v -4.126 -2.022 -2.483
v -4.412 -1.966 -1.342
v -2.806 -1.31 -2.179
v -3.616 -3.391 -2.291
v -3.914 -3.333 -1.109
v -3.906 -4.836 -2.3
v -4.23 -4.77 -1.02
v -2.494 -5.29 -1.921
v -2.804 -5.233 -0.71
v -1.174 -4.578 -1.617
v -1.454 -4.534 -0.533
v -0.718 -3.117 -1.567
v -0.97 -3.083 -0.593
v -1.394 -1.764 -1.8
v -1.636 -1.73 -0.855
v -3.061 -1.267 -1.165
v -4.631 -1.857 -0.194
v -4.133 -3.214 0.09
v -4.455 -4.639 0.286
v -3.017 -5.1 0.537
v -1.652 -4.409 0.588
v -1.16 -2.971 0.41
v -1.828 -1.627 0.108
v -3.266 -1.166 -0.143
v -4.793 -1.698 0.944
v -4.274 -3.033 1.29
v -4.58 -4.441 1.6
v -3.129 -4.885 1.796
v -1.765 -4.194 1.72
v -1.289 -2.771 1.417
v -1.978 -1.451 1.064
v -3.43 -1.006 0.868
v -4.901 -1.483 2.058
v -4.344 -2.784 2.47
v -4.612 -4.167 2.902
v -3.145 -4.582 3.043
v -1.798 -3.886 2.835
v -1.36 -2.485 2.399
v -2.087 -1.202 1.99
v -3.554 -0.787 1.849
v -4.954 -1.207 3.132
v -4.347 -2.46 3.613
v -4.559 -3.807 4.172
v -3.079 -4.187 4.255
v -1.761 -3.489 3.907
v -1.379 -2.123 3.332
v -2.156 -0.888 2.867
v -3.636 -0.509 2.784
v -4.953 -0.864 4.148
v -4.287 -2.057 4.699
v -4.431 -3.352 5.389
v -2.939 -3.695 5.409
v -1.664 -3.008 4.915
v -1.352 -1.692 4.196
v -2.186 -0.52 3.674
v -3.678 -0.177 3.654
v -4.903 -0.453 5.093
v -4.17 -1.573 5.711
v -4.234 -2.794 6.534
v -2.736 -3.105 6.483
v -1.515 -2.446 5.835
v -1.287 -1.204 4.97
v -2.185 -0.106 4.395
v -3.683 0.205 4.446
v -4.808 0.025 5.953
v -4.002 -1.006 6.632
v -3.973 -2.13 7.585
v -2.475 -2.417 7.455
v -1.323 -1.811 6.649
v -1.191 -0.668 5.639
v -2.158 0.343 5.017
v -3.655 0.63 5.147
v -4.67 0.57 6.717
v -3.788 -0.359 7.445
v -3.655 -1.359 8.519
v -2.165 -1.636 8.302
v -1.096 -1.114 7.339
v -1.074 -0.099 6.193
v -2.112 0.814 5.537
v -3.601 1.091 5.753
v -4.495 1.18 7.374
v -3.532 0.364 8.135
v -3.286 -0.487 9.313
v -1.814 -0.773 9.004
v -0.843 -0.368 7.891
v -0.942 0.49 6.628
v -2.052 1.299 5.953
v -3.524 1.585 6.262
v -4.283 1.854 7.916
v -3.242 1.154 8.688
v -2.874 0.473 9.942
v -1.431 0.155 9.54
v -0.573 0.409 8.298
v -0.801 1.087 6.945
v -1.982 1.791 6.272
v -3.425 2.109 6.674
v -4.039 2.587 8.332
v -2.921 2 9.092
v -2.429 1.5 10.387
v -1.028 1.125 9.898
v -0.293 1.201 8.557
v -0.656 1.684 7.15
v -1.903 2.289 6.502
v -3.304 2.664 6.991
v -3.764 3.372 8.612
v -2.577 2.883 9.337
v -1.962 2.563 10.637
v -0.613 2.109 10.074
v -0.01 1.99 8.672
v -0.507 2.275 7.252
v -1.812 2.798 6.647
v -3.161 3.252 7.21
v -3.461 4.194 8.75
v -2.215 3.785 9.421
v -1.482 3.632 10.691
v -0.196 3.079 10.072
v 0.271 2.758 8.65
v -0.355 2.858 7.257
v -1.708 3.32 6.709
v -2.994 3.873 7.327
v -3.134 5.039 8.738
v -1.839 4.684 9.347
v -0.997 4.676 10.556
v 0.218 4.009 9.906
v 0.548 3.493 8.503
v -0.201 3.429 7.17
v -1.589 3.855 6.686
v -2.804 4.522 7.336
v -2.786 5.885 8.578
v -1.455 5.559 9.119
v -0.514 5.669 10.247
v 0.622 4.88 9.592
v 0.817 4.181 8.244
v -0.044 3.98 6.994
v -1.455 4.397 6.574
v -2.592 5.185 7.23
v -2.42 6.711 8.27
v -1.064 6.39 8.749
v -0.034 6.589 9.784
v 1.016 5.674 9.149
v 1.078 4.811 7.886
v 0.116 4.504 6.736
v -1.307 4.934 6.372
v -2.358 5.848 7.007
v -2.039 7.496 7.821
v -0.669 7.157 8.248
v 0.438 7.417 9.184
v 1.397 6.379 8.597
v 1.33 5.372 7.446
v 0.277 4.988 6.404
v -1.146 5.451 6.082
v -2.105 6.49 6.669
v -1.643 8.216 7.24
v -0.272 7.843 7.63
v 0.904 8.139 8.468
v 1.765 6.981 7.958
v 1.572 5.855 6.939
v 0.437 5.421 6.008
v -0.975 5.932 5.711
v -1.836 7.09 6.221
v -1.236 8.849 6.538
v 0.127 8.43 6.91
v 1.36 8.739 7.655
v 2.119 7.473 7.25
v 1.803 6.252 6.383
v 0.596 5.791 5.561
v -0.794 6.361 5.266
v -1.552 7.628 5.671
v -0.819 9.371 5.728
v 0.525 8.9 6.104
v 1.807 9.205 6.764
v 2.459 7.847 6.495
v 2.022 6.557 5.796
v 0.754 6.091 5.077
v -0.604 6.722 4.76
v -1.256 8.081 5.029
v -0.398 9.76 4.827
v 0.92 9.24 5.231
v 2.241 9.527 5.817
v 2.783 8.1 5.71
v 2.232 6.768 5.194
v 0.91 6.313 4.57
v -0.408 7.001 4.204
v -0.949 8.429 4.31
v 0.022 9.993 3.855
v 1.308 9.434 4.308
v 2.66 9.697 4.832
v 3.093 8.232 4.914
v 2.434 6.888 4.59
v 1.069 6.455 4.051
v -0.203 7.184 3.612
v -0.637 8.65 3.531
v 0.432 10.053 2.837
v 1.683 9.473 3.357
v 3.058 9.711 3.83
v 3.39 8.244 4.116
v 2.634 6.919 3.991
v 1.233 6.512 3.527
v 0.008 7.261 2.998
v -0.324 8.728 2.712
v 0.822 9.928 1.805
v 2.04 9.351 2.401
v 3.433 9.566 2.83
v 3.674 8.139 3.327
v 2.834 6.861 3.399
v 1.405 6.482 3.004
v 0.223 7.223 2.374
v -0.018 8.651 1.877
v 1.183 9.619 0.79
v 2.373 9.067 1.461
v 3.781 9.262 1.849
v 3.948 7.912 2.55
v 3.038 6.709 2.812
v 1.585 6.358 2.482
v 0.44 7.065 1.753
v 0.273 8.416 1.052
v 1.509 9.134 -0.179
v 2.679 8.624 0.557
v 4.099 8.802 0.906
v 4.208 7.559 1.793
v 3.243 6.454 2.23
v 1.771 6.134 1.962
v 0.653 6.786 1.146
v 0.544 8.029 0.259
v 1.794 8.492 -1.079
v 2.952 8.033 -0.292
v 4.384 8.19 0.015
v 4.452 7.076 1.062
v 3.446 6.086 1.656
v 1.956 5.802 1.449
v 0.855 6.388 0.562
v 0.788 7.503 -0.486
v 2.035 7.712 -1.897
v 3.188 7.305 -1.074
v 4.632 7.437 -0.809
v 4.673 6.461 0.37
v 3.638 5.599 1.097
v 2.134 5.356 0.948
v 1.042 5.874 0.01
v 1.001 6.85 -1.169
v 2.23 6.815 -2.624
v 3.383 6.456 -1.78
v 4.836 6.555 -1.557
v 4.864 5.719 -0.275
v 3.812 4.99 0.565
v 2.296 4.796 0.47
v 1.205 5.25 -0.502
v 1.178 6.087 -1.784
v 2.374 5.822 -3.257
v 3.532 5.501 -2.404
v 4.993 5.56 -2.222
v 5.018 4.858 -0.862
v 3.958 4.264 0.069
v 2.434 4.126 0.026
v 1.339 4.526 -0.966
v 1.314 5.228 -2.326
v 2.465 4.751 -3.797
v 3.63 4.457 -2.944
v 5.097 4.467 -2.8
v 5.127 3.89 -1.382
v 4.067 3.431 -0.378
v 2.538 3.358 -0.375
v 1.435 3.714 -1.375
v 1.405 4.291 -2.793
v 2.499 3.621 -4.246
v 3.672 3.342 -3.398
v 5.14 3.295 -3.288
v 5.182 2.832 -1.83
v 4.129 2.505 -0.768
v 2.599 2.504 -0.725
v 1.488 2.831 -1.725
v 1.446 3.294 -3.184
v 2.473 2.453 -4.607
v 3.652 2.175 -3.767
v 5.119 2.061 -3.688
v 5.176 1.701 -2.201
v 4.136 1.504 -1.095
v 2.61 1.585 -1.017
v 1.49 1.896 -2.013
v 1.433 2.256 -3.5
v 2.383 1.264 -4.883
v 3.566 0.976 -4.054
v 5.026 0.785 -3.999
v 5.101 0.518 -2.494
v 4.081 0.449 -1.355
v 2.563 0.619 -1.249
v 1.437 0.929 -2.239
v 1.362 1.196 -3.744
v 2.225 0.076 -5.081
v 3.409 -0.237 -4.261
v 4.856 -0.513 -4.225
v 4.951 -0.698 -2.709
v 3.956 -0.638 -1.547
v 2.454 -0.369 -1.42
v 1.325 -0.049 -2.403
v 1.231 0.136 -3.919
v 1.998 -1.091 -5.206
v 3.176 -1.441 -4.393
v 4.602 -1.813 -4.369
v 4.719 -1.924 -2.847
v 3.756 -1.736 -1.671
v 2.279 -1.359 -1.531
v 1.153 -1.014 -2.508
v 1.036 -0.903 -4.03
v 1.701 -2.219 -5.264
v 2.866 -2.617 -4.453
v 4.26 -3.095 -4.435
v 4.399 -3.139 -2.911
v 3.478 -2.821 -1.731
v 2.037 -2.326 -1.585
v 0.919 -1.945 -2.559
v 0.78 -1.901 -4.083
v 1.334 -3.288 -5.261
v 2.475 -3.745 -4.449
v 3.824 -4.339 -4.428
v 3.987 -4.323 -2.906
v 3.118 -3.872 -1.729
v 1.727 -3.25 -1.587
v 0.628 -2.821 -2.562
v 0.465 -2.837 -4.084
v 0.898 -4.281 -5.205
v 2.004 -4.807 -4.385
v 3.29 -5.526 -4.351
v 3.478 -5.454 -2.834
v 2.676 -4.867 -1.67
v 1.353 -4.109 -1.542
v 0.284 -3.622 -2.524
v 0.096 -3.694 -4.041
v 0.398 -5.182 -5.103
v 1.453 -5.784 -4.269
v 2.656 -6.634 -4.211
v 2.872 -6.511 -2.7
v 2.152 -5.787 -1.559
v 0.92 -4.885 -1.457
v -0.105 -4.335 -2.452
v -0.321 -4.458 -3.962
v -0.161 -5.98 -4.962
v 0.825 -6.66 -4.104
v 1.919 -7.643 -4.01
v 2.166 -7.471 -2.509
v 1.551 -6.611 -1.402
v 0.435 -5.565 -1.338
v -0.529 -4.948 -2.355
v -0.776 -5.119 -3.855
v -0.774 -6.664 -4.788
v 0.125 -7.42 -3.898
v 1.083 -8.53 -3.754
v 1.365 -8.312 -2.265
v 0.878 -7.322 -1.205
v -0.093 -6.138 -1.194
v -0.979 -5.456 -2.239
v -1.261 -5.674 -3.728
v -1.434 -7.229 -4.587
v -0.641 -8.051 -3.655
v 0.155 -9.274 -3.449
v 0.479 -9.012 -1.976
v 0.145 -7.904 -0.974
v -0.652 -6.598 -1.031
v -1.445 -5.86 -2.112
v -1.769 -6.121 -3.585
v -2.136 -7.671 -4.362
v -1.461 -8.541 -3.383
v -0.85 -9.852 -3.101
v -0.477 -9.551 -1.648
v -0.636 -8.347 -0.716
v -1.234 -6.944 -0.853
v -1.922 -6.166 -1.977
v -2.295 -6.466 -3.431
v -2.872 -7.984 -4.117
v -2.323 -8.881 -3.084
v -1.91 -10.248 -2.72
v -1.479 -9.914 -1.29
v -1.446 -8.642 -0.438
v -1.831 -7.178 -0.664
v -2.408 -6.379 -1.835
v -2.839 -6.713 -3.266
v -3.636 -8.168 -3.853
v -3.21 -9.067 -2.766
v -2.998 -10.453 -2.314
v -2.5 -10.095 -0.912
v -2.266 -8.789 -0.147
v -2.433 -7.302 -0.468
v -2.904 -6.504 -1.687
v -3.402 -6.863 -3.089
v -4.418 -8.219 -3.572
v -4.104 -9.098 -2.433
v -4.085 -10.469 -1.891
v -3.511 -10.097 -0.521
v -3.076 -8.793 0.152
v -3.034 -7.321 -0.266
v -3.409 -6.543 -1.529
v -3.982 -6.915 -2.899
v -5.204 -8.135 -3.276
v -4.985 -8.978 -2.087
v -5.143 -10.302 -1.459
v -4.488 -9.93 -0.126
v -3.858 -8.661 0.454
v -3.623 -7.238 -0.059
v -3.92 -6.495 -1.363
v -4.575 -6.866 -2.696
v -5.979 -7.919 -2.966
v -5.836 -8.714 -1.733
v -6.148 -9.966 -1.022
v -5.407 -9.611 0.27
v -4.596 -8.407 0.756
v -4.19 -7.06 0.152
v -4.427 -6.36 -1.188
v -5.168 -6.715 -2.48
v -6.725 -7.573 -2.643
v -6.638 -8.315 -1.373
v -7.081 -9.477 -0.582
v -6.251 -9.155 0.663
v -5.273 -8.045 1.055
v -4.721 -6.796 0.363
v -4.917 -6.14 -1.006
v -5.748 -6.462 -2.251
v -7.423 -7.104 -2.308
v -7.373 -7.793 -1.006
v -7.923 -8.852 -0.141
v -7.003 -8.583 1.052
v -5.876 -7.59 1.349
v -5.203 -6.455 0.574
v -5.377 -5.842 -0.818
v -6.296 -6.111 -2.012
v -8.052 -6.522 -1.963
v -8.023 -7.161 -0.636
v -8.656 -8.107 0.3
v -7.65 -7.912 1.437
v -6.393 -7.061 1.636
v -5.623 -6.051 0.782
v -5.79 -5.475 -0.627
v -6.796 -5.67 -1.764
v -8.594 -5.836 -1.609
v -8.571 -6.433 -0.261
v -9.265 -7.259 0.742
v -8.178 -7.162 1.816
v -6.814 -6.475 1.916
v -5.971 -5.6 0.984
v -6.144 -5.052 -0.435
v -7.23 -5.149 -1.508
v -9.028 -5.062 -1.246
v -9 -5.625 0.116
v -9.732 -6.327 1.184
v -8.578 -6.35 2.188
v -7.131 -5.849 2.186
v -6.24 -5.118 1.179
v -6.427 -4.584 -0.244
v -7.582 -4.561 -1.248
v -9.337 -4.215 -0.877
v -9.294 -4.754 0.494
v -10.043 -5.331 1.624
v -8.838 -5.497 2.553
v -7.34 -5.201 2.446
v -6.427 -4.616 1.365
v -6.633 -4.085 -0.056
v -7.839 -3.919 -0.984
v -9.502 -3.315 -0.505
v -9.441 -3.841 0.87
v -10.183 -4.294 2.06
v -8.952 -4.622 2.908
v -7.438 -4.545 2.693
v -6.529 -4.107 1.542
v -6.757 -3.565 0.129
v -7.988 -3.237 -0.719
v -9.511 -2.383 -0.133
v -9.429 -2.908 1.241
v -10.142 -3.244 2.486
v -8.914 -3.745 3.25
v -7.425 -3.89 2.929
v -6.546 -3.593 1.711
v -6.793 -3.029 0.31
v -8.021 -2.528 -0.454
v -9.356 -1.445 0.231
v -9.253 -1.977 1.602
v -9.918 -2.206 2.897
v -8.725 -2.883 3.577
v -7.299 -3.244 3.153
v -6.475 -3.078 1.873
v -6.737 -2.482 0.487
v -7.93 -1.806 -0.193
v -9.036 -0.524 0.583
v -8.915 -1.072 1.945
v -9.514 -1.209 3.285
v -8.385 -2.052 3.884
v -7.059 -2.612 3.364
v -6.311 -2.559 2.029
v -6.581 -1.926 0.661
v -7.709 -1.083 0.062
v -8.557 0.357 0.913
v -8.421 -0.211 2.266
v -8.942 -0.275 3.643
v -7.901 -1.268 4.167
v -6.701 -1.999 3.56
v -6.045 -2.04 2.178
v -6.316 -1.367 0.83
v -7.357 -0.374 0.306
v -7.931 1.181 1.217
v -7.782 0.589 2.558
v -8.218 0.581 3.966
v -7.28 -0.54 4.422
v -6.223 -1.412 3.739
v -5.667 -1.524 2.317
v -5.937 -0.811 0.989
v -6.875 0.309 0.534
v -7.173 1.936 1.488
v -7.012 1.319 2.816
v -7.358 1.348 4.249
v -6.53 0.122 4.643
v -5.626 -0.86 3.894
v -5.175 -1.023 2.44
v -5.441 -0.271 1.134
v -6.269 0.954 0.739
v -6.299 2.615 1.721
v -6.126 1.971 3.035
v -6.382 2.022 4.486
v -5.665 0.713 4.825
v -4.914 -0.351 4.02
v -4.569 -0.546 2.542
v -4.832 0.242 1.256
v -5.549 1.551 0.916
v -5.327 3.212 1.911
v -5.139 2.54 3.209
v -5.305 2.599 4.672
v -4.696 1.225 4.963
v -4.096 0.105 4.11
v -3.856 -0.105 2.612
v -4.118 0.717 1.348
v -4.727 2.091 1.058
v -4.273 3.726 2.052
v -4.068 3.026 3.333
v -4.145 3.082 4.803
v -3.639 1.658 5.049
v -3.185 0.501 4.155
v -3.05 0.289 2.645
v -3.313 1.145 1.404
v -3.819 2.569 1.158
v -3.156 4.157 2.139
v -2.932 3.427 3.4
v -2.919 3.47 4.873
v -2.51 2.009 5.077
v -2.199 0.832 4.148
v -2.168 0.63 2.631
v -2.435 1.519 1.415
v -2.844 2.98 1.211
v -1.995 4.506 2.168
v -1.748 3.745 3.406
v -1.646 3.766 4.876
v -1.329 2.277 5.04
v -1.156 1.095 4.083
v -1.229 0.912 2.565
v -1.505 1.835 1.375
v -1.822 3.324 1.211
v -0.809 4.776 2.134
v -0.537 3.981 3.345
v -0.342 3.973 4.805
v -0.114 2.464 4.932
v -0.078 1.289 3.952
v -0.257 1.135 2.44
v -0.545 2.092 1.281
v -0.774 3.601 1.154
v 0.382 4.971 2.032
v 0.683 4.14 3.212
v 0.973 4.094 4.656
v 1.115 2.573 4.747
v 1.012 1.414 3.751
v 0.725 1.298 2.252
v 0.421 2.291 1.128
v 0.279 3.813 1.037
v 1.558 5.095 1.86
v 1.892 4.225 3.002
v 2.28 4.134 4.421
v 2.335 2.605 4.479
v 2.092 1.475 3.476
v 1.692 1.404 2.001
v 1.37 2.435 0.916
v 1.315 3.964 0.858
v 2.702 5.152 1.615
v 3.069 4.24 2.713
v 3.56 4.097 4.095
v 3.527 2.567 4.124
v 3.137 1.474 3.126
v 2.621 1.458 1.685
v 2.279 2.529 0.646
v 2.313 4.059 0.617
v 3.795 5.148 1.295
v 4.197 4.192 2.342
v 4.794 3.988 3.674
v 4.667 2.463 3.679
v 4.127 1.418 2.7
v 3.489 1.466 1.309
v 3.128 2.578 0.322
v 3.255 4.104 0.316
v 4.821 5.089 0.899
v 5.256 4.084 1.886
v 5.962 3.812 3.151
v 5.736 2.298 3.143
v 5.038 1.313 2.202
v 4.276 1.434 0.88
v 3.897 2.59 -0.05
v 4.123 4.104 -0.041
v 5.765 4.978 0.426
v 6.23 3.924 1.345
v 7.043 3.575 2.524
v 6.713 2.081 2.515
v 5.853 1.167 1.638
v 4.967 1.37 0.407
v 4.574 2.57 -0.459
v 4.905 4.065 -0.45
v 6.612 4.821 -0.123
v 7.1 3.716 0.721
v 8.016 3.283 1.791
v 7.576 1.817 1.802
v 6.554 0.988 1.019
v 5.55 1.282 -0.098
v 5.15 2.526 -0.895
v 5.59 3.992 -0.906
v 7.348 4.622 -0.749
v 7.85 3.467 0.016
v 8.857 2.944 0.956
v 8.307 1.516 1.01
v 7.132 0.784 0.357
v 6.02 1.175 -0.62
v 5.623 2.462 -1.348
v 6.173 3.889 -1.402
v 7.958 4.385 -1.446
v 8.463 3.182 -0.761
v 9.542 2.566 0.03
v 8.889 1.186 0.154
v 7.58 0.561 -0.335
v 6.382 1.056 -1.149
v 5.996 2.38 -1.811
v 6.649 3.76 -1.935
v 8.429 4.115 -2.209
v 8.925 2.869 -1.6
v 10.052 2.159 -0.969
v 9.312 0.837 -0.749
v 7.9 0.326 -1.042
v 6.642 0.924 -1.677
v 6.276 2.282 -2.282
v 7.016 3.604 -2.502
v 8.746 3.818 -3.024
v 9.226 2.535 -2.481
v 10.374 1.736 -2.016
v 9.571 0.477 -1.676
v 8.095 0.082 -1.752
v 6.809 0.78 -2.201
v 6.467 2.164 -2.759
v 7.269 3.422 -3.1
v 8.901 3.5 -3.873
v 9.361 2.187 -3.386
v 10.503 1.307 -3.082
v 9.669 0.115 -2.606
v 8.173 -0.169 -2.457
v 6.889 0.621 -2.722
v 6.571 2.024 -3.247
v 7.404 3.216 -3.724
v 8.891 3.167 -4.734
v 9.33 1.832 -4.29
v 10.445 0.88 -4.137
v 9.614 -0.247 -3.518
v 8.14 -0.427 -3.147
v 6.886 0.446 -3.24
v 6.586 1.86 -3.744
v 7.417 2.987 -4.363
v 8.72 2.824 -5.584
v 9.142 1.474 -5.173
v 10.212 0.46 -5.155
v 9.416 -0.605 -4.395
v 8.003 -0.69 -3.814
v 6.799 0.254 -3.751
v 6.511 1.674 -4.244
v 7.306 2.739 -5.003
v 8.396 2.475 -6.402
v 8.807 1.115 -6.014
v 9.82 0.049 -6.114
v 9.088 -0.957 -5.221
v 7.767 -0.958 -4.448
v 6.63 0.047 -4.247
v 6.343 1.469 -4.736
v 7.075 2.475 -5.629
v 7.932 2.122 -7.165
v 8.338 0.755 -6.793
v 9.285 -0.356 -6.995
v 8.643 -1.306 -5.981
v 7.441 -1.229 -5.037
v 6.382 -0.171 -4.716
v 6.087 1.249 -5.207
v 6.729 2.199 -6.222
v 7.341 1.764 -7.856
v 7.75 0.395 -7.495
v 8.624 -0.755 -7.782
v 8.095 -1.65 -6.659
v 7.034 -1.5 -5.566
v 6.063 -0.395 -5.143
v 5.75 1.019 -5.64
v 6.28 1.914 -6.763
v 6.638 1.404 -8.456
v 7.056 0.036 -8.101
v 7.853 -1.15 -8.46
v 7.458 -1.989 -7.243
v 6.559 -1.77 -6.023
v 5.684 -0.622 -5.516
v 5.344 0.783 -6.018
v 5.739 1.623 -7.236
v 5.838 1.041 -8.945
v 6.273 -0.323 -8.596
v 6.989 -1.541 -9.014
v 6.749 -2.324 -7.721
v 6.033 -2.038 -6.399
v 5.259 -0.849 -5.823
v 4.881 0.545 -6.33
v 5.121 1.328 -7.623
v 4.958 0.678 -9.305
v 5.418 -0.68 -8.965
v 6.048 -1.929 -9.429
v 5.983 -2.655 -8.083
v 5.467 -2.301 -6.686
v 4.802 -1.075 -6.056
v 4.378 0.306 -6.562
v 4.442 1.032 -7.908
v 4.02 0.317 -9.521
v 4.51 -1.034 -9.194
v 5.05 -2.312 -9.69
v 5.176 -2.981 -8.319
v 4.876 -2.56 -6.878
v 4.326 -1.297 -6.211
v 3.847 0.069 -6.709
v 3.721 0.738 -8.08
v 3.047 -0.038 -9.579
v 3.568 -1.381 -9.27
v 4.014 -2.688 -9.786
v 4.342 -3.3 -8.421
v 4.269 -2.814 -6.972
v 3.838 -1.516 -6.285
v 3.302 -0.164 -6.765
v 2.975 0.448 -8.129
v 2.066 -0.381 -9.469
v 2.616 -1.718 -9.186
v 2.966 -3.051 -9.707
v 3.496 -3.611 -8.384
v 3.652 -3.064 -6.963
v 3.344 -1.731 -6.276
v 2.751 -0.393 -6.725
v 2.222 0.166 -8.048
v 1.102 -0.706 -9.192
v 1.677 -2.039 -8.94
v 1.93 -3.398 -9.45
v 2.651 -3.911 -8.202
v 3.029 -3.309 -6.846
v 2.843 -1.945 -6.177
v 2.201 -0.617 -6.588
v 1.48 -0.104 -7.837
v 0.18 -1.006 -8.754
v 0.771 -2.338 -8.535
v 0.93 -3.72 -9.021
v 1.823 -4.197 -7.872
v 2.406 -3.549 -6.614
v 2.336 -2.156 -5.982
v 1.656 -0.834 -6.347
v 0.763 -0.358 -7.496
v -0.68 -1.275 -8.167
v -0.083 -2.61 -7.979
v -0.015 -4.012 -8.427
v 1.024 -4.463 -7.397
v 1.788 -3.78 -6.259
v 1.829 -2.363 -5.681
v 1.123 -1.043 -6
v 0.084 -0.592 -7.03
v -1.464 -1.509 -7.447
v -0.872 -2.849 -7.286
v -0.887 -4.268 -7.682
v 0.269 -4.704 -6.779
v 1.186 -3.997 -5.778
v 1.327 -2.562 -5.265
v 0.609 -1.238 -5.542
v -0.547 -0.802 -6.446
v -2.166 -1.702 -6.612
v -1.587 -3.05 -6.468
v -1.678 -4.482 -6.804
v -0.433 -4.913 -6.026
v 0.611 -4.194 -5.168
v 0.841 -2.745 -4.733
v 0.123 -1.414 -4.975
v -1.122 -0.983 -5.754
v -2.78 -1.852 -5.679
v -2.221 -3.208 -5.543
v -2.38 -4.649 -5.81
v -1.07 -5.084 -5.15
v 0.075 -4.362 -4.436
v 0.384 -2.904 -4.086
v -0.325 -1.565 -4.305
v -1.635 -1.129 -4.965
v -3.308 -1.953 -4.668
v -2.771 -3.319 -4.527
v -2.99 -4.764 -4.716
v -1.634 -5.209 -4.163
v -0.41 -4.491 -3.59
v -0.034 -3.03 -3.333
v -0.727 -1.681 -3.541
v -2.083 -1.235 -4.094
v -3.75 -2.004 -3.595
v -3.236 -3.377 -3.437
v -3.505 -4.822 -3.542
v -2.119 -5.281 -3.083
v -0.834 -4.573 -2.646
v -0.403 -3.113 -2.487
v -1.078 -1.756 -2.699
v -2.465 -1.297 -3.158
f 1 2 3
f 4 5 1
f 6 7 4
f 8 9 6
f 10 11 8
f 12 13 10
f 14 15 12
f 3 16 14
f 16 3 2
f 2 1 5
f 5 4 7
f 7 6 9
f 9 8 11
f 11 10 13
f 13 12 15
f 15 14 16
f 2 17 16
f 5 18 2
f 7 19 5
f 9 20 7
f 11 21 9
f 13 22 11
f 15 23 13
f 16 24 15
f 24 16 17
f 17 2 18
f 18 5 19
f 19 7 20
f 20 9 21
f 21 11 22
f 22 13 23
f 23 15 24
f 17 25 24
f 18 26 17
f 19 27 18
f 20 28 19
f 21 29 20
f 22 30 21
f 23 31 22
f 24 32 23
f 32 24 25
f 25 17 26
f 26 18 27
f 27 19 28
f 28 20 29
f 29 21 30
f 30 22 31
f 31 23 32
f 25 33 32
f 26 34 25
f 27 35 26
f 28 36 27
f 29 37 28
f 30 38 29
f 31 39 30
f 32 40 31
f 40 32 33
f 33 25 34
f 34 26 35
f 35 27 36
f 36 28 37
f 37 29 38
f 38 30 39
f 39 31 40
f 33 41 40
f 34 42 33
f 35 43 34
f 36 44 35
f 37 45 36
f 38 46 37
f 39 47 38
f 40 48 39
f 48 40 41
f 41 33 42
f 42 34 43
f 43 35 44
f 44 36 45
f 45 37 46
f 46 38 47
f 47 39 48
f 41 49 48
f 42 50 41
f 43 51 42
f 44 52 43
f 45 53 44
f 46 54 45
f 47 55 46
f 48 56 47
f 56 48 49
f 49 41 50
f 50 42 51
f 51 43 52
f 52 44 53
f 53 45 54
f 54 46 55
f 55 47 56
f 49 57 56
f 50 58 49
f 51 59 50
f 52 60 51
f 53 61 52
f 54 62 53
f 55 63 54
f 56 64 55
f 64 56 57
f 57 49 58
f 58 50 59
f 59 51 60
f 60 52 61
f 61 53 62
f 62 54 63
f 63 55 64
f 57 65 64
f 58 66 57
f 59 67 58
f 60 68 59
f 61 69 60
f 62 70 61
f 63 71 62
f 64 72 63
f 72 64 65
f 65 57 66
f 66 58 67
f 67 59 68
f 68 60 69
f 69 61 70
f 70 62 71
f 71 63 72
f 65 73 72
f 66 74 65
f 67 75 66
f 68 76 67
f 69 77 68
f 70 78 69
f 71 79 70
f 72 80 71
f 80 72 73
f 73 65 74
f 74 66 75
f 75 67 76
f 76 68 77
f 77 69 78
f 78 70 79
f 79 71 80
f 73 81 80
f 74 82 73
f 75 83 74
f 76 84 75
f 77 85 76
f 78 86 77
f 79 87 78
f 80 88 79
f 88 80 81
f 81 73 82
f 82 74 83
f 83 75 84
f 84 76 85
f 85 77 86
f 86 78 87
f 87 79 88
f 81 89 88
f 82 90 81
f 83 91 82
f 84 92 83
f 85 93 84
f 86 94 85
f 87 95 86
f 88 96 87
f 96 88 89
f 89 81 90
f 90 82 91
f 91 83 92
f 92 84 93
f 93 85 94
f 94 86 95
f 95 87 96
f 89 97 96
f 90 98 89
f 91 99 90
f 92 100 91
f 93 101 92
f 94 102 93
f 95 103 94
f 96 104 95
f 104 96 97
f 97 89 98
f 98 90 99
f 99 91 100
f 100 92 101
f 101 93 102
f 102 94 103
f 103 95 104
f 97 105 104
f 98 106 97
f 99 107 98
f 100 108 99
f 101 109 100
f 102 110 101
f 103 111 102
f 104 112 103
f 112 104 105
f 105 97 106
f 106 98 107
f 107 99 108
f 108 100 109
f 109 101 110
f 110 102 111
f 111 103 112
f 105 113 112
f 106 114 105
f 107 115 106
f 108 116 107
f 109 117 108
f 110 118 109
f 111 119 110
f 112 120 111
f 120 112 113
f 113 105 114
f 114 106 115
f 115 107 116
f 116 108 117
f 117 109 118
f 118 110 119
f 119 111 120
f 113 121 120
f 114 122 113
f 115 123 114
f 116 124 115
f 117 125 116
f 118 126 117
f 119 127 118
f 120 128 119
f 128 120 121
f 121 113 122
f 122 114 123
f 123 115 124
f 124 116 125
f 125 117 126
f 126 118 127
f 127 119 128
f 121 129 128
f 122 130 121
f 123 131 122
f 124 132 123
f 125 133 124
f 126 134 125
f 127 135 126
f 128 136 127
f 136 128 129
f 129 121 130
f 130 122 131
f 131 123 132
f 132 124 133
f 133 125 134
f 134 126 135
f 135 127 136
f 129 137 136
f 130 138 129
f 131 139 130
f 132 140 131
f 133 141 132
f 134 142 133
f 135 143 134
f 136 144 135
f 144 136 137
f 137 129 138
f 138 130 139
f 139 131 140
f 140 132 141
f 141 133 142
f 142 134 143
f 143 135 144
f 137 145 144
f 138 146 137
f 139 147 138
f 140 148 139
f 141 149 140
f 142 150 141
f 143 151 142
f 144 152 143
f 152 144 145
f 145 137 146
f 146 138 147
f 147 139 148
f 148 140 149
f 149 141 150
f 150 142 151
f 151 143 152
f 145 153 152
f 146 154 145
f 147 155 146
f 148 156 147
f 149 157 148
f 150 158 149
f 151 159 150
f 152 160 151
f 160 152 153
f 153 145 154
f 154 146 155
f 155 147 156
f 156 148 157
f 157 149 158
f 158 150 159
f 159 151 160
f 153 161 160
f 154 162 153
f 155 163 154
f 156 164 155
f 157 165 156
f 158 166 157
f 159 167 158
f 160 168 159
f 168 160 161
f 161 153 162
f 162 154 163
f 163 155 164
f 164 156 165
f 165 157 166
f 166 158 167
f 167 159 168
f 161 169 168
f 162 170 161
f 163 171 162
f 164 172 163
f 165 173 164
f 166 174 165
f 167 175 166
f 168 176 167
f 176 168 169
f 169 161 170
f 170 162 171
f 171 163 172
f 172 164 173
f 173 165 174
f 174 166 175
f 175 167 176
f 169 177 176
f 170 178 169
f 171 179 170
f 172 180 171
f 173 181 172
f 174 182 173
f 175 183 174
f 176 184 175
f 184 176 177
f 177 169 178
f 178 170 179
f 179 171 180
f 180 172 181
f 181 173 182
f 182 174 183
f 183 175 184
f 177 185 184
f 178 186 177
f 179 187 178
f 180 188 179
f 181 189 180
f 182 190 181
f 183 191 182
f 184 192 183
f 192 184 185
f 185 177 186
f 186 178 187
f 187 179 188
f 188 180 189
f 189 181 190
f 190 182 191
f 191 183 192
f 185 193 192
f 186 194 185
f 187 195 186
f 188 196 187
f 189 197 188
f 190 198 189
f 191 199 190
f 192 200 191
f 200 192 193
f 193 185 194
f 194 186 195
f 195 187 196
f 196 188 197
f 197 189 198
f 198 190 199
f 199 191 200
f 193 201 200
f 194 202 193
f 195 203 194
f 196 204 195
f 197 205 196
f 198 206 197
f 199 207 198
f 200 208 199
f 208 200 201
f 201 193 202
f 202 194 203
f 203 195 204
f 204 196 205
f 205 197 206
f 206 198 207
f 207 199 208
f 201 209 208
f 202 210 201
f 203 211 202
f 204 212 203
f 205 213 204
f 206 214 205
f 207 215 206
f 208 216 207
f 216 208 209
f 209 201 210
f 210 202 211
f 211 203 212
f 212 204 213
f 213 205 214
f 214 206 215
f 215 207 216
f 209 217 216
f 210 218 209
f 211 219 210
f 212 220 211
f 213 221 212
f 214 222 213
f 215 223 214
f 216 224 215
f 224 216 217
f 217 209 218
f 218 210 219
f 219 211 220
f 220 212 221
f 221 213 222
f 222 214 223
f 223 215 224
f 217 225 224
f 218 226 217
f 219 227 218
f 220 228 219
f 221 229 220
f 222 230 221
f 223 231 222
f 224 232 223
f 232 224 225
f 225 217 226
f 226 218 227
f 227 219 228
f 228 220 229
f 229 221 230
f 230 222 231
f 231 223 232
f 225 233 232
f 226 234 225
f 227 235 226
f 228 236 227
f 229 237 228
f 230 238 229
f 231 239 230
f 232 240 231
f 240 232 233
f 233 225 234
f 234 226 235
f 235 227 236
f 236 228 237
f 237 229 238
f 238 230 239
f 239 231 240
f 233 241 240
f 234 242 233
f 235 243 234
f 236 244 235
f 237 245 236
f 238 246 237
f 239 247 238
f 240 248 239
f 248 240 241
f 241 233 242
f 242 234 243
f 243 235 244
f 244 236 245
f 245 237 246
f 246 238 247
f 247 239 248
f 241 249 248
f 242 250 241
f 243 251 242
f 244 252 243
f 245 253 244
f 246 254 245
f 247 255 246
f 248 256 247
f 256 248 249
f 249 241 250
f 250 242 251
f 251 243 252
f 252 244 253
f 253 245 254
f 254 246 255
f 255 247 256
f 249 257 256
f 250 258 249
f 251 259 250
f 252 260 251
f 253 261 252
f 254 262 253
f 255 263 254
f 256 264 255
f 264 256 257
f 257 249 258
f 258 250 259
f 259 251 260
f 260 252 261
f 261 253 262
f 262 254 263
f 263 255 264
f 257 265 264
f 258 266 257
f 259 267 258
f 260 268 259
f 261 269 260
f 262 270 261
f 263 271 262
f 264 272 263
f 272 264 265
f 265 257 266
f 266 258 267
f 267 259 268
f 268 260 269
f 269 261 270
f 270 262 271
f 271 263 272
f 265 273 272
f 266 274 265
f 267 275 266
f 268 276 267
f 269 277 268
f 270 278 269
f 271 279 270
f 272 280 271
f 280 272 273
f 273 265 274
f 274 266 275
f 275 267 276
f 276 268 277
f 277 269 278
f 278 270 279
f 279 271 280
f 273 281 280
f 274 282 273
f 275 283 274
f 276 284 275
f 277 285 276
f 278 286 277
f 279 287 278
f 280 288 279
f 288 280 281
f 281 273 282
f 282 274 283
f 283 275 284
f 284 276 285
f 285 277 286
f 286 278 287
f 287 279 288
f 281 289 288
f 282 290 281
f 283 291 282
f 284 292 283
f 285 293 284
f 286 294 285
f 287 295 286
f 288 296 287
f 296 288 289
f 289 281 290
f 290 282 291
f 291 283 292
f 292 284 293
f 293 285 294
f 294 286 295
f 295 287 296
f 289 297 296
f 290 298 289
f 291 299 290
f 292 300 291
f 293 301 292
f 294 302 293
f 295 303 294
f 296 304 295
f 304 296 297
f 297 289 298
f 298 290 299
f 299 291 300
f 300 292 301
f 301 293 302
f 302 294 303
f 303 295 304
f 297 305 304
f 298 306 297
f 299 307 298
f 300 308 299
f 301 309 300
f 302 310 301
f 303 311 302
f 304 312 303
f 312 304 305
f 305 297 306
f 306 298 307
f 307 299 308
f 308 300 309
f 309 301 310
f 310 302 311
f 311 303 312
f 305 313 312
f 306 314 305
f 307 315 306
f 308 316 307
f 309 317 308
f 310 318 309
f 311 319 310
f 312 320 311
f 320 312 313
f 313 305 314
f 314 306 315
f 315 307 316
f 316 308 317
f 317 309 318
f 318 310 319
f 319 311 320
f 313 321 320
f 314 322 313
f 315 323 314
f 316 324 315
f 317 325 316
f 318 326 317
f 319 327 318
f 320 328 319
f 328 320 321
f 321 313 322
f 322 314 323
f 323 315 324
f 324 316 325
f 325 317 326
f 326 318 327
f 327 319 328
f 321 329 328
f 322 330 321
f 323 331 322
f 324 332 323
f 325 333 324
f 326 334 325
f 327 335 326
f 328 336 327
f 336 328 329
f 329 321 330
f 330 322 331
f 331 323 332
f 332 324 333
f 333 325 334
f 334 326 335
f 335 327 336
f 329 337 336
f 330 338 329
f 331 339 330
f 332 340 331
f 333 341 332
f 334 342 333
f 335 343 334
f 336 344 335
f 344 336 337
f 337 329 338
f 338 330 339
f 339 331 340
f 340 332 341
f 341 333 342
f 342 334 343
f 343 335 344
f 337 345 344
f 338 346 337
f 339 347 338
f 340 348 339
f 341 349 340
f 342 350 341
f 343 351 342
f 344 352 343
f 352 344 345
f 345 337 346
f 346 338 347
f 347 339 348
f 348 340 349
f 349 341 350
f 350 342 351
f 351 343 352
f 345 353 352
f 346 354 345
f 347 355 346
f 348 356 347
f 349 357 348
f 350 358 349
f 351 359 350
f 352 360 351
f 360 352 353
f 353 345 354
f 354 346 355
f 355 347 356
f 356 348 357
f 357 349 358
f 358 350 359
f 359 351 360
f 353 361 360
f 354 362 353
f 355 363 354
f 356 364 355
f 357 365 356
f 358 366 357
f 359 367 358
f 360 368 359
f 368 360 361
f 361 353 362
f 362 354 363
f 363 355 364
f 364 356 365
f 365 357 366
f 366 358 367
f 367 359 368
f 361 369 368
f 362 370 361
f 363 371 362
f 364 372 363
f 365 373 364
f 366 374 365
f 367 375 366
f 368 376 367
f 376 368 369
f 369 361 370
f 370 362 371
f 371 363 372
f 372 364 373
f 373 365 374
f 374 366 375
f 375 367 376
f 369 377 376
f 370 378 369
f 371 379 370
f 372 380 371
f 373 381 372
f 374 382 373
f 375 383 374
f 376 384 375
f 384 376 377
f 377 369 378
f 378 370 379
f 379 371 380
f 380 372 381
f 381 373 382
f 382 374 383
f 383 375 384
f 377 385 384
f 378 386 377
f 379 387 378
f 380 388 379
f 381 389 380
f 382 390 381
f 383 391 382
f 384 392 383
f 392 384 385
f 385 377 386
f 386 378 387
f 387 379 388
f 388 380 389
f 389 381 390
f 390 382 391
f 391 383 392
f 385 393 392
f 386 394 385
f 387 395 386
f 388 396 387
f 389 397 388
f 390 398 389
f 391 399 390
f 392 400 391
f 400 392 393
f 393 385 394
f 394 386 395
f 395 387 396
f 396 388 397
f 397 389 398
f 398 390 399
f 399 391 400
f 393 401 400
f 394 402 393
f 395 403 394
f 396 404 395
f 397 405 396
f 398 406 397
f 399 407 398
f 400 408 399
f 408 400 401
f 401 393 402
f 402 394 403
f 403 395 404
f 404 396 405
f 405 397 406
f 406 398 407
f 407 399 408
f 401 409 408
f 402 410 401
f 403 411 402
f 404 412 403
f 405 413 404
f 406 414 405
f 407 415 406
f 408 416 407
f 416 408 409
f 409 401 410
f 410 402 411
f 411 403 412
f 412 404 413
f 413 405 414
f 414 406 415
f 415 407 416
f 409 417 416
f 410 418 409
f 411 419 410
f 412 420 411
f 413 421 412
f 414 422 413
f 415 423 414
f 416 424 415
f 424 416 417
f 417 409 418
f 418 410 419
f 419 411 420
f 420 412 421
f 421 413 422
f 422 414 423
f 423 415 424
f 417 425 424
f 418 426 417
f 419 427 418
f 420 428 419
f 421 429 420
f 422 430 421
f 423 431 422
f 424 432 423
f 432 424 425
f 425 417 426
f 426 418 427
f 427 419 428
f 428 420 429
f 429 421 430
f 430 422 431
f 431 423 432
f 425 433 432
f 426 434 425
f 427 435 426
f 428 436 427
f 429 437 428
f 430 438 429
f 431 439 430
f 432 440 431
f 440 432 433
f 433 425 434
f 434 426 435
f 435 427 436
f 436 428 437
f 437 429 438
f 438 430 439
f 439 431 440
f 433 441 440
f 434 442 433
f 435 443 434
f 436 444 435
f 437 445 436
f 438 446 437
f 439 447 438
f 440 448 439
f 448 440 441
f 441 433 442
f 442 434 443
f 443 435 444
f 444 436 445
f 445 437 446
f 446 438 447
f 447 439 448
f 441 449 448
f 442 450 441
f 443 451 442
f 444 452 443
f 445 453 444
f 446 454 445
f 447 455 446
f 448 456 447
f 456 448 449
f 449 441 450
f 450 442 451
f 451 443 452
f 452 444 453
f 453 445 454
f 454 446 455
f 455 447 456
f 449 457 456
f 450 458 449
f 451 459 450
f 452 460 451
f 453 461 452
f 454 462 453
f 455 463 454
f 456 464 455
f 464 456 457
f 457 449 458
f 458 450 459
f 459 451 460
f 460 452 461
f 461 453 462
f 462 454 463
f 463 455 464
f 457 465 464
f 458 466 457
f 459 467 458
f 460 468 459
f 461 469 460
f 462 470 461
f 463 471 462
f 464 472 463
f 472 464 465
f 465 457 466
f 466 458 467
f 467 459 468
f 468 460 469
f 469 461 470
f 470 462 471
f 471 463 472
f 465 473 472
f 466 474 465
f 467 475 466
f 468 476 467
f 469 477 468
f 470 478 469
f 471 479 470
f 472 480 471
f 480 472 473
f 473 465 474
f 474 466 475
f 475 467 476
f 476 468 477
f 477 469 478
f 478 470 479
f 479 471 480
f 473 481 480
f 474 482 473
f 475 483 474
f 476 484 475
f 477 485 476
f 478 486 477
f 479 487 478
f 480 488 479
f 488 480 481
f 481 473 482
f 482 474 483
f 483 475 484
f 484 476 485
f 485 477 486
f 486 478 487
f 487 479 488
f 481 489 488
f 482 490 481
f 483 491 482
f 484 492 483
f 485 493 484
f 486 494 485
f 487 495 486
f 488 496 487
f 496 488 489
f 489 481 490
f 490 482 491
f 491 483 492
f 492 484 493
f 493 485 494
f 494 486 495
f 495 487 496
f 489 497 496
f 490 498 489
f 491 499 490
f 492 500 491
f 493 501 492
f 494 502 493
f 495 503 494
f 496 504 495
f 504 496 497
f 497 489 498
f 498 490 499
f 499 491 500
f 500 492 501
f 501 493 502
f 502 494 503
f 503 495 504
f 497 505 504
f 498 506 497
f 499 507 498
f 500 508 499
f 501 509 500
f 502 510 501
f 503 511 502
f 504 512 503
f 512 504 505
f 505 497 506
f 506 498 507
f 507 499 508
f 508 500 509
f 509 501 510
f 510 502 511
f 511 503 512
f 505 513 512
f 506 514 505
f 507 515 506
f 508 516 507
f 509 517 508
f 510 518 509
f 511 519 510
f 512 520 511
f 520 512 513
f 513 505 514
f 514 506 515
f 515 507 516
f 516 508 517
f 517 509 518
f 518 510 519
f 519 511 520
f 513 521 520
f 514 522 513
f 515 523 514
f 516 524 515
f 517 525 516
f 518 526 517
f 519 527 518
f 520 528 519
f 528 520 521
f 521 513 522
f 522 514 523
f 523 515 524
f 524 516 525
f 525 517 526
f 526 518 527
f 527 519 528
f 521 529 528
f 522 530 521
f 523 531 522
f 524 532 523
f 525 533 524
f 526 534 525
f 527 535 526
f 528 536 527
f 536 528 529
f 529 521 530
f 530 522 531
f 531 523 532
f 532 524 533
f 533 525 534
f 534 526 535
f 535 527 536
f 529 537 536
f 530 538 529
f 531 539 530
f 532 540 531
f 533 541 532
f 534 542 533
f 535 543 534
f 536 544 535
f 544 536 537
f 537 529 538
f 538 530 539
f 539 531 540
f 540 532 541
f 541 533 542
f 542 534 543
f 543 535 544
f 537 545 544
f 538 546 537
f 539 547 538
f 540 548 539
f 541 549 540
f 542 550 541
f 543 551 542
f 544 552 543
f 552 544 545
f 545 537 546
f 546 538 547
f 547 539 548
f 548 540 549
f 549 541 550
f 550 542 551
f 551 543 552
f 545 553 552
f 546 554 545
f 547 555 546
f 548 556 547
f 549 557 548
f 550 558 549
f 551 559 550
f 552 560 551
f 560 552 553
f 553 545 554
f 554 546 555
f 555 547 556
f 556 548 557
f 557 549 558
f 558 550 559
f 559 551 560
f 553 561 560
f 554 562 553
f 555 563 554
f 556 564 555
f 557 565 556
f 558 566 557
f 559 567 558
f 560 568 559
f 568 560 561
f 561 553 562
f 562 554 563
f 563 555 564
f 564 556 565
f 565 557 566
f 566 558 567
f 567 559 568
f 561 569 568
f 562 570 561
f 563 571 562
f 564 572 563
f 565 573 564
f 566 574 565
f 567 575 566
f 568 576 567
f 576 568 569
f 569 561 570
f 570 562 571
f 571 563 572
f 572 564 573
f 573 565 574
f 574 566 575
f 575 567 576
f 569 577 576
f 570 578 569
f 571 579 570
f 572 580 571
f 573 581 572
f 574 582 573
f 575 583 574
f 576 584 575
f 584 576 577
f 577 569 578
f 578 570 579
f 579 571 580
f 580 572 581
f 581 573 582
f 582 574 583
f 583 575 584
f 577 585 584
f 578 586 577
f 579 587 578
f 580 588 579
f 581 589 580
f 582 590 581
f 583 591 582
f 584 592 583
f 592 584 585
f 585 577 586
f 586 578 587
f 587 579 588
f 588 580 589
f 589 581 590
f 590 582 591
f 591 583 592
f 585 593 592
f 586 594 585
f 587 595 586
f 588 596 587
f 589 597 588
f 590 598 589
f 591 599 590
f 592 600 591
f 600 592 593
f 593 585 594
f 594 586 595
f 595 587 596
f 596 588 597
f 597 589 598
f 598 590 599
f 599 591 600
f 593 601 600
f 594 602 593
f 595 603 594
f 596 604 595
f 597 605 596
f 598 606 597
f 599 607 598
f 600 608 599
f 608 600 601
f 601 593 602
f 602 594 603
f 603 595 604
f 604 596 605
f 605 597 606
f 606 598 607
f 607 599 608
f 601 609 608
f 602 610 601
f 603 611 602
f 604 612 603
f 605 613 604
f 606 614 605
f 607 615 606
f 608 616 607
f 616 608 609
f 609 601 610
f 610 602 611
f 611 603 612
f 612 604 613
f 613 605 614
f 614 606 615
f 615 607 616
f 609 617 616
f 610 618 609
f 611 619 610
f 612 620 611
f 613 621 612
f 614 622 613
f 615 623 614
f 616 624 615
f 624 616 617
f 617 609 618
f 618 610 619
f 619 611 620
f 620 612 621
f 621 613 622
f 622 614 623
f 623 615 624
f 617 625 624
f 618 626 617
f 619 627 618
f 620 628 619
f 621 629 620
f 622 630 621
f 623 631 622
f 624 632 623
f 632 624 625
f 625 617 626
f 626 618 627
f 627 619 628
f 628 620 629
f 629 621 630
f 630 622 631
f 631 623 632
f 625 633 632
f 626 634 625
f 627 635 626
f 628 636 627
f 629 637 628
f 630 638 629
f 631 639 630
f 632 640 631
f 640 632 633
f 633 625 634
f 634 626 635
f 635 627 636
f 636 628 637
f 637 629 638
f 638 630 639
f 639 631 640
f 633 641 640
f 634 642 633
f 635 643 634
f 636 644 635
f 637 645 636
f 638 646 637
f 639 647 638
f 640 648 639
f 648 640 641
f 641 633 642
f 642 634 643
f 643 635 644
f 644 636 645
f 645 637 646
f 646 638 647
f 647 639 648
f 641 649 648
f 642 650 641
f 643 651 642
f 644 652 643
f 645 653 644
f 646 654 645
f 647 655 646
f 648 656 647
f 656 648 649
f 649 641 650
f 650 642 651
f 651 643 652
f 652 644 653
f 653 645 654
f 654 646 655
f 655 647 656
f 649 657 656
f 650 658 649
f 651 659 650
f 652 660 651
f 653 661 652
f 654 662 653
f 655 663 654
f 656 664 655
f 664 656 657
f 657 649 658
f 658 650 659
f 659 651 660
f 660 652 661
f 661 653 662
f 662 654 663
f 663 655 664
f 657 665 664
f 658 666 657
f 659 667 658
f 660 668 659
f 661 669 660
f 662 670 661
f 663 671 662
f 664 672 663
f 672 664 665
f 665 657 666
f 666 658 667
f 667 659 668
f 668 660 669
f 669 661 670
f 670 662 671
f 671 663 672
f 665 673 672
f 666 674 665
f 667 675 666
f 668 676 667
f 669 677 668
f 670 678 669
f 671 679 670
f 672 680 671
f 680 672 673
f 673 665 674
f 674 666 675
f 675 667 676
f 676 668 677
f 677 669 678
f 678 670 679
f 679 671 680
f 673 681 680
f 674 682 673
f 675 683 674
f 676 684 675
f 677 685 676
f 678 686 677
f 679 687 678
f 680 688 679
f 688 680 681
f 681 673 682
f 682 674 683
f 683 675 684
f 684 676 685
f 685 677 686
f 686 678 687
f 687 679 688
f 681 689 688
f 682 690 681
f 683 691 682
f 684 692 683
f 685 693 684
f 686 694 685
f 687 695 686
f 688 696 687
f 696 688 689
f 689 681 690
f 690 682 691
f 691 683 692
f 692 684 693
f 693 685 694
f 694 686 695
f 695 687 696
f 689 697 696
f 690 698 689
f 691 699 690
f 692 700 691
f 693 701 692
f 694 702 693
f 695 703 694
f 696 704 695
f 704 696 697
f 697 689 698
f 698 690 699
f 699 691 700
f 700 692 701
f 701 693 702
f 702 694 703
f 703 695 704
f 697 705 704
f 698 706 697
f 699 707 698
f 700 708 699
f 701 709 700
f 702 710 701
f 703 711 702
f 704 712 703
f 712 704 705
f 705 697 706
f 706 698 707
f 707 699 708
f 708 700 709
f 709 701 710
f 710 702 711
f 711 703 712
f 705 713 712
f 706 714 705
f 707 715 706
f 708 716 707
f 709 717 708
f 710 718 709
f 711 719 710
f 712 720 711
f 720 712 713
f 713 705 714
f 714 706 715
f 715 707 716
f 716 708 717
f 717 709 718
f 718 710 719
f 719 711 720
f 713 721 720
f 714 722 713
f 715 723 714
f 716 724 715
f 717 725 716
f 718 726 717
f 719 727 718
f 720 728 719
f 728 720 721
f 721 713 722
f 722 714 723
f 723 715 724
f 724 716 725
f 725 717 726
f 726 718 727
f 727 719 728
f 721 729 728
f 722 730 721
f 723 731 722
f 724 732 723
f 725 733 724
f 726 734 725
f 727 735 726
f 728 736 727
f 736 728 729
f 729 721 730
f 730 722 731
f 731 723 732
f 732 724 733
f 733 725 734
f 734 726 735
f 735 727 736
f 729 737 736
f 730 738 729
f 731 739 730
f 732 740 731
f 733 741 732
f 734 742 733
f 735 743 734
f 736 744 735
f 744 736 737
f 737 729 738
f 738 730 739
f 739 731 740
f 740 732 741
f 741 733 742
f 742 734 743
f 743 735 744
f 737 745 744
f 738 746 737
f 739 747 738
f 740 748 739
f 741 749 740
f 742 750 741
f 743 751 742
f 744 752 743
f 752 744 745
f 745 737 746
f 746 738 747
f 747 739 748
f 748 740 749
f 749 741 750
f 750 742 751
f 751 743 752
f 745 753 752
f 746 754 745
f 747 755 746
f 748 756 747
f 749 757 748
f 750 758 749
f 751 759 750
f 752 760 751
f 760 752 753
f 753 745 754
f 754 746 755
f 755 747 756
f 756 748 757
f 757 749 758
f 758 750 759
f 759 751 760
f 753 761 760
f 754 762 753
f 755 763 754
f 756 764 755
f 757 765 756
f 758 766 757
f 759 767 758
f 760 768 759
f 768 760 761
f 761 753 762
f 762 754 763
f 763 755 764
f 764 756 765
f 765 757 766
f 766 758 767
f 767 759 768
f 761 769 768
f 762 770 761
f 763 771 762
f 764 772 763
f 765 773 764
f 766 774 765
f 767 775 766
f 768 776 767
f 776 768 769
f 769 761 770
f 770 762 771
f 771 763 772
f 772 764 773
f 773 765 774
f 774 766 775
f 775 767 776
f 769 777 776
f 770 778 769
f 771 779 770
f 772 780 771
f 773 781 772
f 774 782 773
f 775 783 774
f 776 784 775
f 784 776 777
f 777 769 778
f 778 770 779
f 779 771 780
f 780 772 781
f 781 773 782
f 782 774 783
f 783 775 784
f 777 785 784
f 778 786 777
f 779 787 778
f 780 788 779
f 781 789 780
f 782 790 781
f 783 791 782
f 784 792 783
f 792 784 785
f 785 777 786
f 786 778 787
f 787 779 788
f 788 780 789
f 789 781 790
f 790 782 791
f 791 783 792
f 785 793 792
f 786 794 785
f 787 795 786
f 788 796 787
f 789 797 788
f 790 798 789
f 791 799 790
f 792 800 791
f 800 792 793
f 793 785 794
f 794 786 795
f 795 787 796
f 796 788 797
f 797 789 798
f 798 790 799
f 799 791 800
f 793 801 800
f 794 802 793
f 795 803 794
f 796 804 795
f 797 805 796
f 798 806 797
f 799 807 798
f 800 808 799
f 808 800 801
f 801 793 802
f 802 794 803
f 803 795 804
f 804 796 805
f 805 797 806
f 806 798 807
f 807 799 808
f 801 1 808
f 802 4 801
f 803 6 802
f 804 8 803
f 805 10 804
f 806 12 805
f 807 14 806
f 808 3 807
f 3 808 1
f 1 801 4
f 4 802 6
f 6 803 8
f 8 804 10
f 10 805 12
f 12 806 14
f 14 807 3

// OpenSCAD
//  path_extrude.scad -- Extrude a path in 3D space
//  usage: add "use <path_extrude.scad>;" to the top of your OpenSCAD source code

//  Copyright (C) 2014-2019  David Eccles (gringer) <bioinformatics@gringene.org>

//  This program is free software: you can redistribute it and/or modify
//  it under the terms of the GNU General Public License as published by
//  the Free Software Foundation, either version 3 of the License, or
//  (at your option) any later version.

//  This program is distributed in the hope that it will be useful,
//  but WITHOUT ANY WARRANTY; without even the implied warranty of
//  MERCHANTABILITY or FITNESS FOR A PARTICULAR PURPOSE.  See the
//  GNU General Public License for more details.

//  You should have received a copy of the GNU General Public License
//  along with this program.  If not, see <https://www.gnu.org/licenses/>.

// Determine the projection of a point on a plane centered at c1 with normal n1
function project(p, c, n) = p - (n * (p - c)) * n / (n * n);

// determine angle between two points with a given normal orientation
// see https://stackoverflow.com/questions/14066933/
//        direct-way-of-computing-clockwise-angle-between-2-vectors
//    dot = p1 * p2;
//    det = (p1[0]*p2[1]*n1[2] + p2[0]*n1[1]*p1[2] + n1[0]*p1[1]*p2[2]) -
//          (n1[0]*p2[1]*p1[2] + p1[0]*n1[1]*p2[2] + p2[0]*p1[1]*n1[2]);
//    atan2(det, dot);
// determine angle between two planar points and a centre
// with a given normal orientation
function getPlanarAngle(p1, p2, c1, n1) = let(p1 = p1 - c1, n1 = n1 / norm(n1), p2 = p2 - c1)
    atan2((p1[0] * p2[1] * n1[2] + p2[0] * n1[1] * p1[2] + n1[0] * p1[1] * p2[2]) -
              (n1[0] * p2[1] * p1[2] + p1[0] * n1[1] * p2[2] + p2[0] * p1[1] * n1[2]),
          p1 *p2);

function c3D(tPoints) = (len(tPoints[0]) == undef) ? // single point
                            c3D([tPoints])[0]
                                                   : (len(tPoints[0]) < 3) ? // collection of 2D points
                                                         tPoints * [ [ 1, 0, 0 ], [ 0, 1, 0 ] ]
                                                                           : tPoints; // 3D points

// translate a point (or points)
function myTranslate(ofs, points, acc = []) =
    (len(points[0]) == undef)
        ? myTranslate(ofs, [points])[0]
        : [for (i = [0:(len(points) - 1)])[for (d = [0:(len(points[0]) - 1)])(ofs[d] + points[i][d])]];

// rotate a point (or points)
function myRotate(rotVec, points) =
    let(rotX = [ [ 1, 0, 0 ], [ 0, cos(rotVec[0]), -sin(rotVec[0]) ], [ 0, sin(rotVec[0]), cos(rotVec[0]) ] ],
        rotY = [[cos(rotVec[1]), 0, -sin(rotVec[1])], [0, 1, 0], [sin(rotVec[1]), 0, cos(rotVec[1])]],
        rotZ = [[cos(rotVec[2]), sin(rotVec[2]), 0], [sin(rotVec[2]), -cos(rotVec[2]), 0], [0, 0, 1]])(len(points[0]) ==
                                                                                                       undef)
        ? myRotate(rotVec, [points])[0]
        : c3D(points) * rotX * rotY * rotZ;

// Determine spherical rotation for cartesian coordinates
function rToS(pt) = [ -acos((pt[2]) / norm(pt)), 0, -atan2(pt[0], pt[1]) ];

function calcPreRot(p1, p2,
                    p3) = let(n1 = p2 - p1, // normal between the two points (i.e. the plane that the polygon sits on)
                              n2 = p3 - p2, rt1 = rToS(n1), rt2 = rToS(n2),
                              pj1 = (p2 + myRotate(rt2, [[ 2, 0, 0.5 ]])[0]),
                              pj2 = project(p = (p1 + myRotate(rt1, [[ 2, 0, 0.5 ]])[0]), c = p2, n = n2))
    getPlanarAngle(p1 = pj1, p2 = pj2, c1 = p2, n1 = n2);

function cumSum(x, res = []) = (len(x) == len(res)) ? concat([0], res)
                               : (len(res) == 0)    ? cumSum(x = x, res = [x[0]])
                                                 : cumSum(x = x, res = concat(res, [x[len(res)] + res[len(res) - 1]]));

// Create extrusion side panels for one polygon segment as triangles.
// Note: panels are not necessarily be planar due to path twists
function makeSides(shs, pts, ofs = 0) = concat(
    [for (i = [0:(shs - 1)])[i + ofs, ((i + 1) % shs + ofs + shs) % (shs * pts), (i + 1) % shs + ofs]],
    [for (i = [0:(shs - 1)])[((i + 1) % shs + ofs + shs) % (shs * pts), i + ofs, (i + ofs + shs) % (shs * pts)]]);

// Concatenate the contents of the outermost list
function flatten(A, acc = [],
                 aDone = 0) = (aDone >= len(A)) ? acc : flatten(A, acc = concat(acc, A[aDone]), aDone = aDone + 1);

// Linearly interpolate between two shapes
function makeTween(shape1, shape2,
                   t) = (t == 0) ? shape1
                        : (t == 1)
                            ? shape2
                            : [for (i = [0:(len(shape1) - 1)])(shape1[i] * (1 - t) + shape2[i % len(shape2)] * (t))];

// Extrude a 2D shape through a 3D path
// Note: merge has two effects:
//   1) Removes end caps
//   2) Adjusts the rotation of each path point
//      so that the end and start match up
module path_extrude(exPath, exShape, exShape2 = [], exRots = [0], exScale = [1], merge = false)
{
    echo(len(exShape2));
    exShapeTween = (len(exShape2) == 0) ? exShape : exShape2;
    shs = len(exShape); // shs: shape size
    pts = len(exPath);  // pts: path size
    exPathX = (merge) ? concat(exPath, [ exPath[0], exPath[1] ]) : concat(exPath, [
        exPath[pts - 1] + (exPath[pts - 1] - exPath[pts - 2]), exPath[pts - 1] + 2 * (exPath[pts - 1] - exPath[pts - 2])
    ]);
    exScaleX = (len(exScale) == len(exPath)) ? exScale : [for (i = [0:(pts - 1)]) exScale[i % len(exScale)]];
    preRots = [for (i = [0:(pts - 1)]) calcPreRot(p1 = exPathX[i],       // "current" point on the path
                                                  p2 = exPathX[(i + 1)], // "next" point on the path
                                                  p3 = exPathX[(i + 2)])];
    cumPreRots = cumSum(preRots);
    seDiff = cumPreRots[len(cumPreRots) - 1]; // rotation difference (start - end)
    // rotation adjustment to get start to look like end
    seAdj = -seDiff / (len(cumPreRots));
    adjPreRots = (!merge) ? cumPreRots : [for (i = [0:(pts - 1)])(cumPreRots[i] + seAdj * i)];
    adjExRots = (len(exRots) == 1) ? [for (i = [0:(len(adjPreRots) - 1)])(adjPreRots[i] + exRots[0])]
                                   : [for (i = [0:(len(adjPreRots) - 1)])(adjPreRots[i] + exRots[i % len(exRots)])];
    phPoints = flatten([for (i = [0:(pts - 1)]) let(p1 = exPathX[i], p2 = exPathX[(i + 1)],
                                                    n1 = p2 - p1, // normal between the two points
                                                    rt1 = rToS(n1))
            myTranslate(p1,
                        myRotate(rt1, myRotate([ 0, 0, -adjExRots[i] ],
                                               c3D(makeTween(exShape, exShapeTween, i / (pts - 1)) * exScaleX[i]))))]);
    if (merge)
    { // just the surface, no end caps
        polyhedron(points = phPoints, faces = flatten([for (i = [0:(pts - 1)]) makeSides(shs, pts, ofs = shs * i)]));
    }
    else
    {
        polyhedron(points = phPoints,
                   faces = concat(flatten([for (i = [0:(pts - 2)]) makeSides(shs, pts, ofs = shs * i)]),
                                  concat( // add in start / end covers
                                      [[for (i = [0:(shs - 1)]) i]],
                                      [[for (i = [(len(phPoints) - 1):-1:(len(phPoints) - shs)]) i]])));
    }
}

myPathTrefoil = [for (t = [0:(360 / 101):359])[ // trefoil knot
    5 * (.41 * cos(t) - .18 * sin(t) - .83 * cos(2 * t) - .83 * sin(2 * t) - .11 * cos(3 * t) + .27 * sin(3 * t)),
    5 * (.36 * cos(t) + .27 * sin(t) - 1.13 * cos(2 * t) + .30 * sin(2 * t) + .11 * cos(3 * t) - .27 * sin(3 * t)),
    5 * (.45 * sin(t) - .30 * cos(2 * t) + 1.13 * sin(2 * t) - .11 * cos(3 * t) + .27 * sin(3 * t))]];

myPointsOctagon = let(ofs1 = 15)[for (t = [0:(360 / 8):359])((t == 90) ? 1 : 2) * [ cos(t + ofs1), sin(t + ofs1) ]];
myPointsChunkOctagon =
    let(ofs1 = 15)[for (t = [0:(360 / 8):359])((t == 90) ? 0.4 : 1.9) *
                   [ cos((t * 135 / 360 + 45) + ofs1 + 45) + 0.5, sin((t * 135 / 360 + 45) + ofs1 + 45) ]];
// myPoints = [ for(t = [0:(360/8):359]) 2 * [cos(t+45),sin(t+45)]];

pts = [ 2, 0, 0.5 ];

translate([ 0, 0, 0 ])
{
    path_extrude(exRots = [$t * 360], exShape = myPointsOctagon, exPath = myPathTrefoil, merge = true);
}
